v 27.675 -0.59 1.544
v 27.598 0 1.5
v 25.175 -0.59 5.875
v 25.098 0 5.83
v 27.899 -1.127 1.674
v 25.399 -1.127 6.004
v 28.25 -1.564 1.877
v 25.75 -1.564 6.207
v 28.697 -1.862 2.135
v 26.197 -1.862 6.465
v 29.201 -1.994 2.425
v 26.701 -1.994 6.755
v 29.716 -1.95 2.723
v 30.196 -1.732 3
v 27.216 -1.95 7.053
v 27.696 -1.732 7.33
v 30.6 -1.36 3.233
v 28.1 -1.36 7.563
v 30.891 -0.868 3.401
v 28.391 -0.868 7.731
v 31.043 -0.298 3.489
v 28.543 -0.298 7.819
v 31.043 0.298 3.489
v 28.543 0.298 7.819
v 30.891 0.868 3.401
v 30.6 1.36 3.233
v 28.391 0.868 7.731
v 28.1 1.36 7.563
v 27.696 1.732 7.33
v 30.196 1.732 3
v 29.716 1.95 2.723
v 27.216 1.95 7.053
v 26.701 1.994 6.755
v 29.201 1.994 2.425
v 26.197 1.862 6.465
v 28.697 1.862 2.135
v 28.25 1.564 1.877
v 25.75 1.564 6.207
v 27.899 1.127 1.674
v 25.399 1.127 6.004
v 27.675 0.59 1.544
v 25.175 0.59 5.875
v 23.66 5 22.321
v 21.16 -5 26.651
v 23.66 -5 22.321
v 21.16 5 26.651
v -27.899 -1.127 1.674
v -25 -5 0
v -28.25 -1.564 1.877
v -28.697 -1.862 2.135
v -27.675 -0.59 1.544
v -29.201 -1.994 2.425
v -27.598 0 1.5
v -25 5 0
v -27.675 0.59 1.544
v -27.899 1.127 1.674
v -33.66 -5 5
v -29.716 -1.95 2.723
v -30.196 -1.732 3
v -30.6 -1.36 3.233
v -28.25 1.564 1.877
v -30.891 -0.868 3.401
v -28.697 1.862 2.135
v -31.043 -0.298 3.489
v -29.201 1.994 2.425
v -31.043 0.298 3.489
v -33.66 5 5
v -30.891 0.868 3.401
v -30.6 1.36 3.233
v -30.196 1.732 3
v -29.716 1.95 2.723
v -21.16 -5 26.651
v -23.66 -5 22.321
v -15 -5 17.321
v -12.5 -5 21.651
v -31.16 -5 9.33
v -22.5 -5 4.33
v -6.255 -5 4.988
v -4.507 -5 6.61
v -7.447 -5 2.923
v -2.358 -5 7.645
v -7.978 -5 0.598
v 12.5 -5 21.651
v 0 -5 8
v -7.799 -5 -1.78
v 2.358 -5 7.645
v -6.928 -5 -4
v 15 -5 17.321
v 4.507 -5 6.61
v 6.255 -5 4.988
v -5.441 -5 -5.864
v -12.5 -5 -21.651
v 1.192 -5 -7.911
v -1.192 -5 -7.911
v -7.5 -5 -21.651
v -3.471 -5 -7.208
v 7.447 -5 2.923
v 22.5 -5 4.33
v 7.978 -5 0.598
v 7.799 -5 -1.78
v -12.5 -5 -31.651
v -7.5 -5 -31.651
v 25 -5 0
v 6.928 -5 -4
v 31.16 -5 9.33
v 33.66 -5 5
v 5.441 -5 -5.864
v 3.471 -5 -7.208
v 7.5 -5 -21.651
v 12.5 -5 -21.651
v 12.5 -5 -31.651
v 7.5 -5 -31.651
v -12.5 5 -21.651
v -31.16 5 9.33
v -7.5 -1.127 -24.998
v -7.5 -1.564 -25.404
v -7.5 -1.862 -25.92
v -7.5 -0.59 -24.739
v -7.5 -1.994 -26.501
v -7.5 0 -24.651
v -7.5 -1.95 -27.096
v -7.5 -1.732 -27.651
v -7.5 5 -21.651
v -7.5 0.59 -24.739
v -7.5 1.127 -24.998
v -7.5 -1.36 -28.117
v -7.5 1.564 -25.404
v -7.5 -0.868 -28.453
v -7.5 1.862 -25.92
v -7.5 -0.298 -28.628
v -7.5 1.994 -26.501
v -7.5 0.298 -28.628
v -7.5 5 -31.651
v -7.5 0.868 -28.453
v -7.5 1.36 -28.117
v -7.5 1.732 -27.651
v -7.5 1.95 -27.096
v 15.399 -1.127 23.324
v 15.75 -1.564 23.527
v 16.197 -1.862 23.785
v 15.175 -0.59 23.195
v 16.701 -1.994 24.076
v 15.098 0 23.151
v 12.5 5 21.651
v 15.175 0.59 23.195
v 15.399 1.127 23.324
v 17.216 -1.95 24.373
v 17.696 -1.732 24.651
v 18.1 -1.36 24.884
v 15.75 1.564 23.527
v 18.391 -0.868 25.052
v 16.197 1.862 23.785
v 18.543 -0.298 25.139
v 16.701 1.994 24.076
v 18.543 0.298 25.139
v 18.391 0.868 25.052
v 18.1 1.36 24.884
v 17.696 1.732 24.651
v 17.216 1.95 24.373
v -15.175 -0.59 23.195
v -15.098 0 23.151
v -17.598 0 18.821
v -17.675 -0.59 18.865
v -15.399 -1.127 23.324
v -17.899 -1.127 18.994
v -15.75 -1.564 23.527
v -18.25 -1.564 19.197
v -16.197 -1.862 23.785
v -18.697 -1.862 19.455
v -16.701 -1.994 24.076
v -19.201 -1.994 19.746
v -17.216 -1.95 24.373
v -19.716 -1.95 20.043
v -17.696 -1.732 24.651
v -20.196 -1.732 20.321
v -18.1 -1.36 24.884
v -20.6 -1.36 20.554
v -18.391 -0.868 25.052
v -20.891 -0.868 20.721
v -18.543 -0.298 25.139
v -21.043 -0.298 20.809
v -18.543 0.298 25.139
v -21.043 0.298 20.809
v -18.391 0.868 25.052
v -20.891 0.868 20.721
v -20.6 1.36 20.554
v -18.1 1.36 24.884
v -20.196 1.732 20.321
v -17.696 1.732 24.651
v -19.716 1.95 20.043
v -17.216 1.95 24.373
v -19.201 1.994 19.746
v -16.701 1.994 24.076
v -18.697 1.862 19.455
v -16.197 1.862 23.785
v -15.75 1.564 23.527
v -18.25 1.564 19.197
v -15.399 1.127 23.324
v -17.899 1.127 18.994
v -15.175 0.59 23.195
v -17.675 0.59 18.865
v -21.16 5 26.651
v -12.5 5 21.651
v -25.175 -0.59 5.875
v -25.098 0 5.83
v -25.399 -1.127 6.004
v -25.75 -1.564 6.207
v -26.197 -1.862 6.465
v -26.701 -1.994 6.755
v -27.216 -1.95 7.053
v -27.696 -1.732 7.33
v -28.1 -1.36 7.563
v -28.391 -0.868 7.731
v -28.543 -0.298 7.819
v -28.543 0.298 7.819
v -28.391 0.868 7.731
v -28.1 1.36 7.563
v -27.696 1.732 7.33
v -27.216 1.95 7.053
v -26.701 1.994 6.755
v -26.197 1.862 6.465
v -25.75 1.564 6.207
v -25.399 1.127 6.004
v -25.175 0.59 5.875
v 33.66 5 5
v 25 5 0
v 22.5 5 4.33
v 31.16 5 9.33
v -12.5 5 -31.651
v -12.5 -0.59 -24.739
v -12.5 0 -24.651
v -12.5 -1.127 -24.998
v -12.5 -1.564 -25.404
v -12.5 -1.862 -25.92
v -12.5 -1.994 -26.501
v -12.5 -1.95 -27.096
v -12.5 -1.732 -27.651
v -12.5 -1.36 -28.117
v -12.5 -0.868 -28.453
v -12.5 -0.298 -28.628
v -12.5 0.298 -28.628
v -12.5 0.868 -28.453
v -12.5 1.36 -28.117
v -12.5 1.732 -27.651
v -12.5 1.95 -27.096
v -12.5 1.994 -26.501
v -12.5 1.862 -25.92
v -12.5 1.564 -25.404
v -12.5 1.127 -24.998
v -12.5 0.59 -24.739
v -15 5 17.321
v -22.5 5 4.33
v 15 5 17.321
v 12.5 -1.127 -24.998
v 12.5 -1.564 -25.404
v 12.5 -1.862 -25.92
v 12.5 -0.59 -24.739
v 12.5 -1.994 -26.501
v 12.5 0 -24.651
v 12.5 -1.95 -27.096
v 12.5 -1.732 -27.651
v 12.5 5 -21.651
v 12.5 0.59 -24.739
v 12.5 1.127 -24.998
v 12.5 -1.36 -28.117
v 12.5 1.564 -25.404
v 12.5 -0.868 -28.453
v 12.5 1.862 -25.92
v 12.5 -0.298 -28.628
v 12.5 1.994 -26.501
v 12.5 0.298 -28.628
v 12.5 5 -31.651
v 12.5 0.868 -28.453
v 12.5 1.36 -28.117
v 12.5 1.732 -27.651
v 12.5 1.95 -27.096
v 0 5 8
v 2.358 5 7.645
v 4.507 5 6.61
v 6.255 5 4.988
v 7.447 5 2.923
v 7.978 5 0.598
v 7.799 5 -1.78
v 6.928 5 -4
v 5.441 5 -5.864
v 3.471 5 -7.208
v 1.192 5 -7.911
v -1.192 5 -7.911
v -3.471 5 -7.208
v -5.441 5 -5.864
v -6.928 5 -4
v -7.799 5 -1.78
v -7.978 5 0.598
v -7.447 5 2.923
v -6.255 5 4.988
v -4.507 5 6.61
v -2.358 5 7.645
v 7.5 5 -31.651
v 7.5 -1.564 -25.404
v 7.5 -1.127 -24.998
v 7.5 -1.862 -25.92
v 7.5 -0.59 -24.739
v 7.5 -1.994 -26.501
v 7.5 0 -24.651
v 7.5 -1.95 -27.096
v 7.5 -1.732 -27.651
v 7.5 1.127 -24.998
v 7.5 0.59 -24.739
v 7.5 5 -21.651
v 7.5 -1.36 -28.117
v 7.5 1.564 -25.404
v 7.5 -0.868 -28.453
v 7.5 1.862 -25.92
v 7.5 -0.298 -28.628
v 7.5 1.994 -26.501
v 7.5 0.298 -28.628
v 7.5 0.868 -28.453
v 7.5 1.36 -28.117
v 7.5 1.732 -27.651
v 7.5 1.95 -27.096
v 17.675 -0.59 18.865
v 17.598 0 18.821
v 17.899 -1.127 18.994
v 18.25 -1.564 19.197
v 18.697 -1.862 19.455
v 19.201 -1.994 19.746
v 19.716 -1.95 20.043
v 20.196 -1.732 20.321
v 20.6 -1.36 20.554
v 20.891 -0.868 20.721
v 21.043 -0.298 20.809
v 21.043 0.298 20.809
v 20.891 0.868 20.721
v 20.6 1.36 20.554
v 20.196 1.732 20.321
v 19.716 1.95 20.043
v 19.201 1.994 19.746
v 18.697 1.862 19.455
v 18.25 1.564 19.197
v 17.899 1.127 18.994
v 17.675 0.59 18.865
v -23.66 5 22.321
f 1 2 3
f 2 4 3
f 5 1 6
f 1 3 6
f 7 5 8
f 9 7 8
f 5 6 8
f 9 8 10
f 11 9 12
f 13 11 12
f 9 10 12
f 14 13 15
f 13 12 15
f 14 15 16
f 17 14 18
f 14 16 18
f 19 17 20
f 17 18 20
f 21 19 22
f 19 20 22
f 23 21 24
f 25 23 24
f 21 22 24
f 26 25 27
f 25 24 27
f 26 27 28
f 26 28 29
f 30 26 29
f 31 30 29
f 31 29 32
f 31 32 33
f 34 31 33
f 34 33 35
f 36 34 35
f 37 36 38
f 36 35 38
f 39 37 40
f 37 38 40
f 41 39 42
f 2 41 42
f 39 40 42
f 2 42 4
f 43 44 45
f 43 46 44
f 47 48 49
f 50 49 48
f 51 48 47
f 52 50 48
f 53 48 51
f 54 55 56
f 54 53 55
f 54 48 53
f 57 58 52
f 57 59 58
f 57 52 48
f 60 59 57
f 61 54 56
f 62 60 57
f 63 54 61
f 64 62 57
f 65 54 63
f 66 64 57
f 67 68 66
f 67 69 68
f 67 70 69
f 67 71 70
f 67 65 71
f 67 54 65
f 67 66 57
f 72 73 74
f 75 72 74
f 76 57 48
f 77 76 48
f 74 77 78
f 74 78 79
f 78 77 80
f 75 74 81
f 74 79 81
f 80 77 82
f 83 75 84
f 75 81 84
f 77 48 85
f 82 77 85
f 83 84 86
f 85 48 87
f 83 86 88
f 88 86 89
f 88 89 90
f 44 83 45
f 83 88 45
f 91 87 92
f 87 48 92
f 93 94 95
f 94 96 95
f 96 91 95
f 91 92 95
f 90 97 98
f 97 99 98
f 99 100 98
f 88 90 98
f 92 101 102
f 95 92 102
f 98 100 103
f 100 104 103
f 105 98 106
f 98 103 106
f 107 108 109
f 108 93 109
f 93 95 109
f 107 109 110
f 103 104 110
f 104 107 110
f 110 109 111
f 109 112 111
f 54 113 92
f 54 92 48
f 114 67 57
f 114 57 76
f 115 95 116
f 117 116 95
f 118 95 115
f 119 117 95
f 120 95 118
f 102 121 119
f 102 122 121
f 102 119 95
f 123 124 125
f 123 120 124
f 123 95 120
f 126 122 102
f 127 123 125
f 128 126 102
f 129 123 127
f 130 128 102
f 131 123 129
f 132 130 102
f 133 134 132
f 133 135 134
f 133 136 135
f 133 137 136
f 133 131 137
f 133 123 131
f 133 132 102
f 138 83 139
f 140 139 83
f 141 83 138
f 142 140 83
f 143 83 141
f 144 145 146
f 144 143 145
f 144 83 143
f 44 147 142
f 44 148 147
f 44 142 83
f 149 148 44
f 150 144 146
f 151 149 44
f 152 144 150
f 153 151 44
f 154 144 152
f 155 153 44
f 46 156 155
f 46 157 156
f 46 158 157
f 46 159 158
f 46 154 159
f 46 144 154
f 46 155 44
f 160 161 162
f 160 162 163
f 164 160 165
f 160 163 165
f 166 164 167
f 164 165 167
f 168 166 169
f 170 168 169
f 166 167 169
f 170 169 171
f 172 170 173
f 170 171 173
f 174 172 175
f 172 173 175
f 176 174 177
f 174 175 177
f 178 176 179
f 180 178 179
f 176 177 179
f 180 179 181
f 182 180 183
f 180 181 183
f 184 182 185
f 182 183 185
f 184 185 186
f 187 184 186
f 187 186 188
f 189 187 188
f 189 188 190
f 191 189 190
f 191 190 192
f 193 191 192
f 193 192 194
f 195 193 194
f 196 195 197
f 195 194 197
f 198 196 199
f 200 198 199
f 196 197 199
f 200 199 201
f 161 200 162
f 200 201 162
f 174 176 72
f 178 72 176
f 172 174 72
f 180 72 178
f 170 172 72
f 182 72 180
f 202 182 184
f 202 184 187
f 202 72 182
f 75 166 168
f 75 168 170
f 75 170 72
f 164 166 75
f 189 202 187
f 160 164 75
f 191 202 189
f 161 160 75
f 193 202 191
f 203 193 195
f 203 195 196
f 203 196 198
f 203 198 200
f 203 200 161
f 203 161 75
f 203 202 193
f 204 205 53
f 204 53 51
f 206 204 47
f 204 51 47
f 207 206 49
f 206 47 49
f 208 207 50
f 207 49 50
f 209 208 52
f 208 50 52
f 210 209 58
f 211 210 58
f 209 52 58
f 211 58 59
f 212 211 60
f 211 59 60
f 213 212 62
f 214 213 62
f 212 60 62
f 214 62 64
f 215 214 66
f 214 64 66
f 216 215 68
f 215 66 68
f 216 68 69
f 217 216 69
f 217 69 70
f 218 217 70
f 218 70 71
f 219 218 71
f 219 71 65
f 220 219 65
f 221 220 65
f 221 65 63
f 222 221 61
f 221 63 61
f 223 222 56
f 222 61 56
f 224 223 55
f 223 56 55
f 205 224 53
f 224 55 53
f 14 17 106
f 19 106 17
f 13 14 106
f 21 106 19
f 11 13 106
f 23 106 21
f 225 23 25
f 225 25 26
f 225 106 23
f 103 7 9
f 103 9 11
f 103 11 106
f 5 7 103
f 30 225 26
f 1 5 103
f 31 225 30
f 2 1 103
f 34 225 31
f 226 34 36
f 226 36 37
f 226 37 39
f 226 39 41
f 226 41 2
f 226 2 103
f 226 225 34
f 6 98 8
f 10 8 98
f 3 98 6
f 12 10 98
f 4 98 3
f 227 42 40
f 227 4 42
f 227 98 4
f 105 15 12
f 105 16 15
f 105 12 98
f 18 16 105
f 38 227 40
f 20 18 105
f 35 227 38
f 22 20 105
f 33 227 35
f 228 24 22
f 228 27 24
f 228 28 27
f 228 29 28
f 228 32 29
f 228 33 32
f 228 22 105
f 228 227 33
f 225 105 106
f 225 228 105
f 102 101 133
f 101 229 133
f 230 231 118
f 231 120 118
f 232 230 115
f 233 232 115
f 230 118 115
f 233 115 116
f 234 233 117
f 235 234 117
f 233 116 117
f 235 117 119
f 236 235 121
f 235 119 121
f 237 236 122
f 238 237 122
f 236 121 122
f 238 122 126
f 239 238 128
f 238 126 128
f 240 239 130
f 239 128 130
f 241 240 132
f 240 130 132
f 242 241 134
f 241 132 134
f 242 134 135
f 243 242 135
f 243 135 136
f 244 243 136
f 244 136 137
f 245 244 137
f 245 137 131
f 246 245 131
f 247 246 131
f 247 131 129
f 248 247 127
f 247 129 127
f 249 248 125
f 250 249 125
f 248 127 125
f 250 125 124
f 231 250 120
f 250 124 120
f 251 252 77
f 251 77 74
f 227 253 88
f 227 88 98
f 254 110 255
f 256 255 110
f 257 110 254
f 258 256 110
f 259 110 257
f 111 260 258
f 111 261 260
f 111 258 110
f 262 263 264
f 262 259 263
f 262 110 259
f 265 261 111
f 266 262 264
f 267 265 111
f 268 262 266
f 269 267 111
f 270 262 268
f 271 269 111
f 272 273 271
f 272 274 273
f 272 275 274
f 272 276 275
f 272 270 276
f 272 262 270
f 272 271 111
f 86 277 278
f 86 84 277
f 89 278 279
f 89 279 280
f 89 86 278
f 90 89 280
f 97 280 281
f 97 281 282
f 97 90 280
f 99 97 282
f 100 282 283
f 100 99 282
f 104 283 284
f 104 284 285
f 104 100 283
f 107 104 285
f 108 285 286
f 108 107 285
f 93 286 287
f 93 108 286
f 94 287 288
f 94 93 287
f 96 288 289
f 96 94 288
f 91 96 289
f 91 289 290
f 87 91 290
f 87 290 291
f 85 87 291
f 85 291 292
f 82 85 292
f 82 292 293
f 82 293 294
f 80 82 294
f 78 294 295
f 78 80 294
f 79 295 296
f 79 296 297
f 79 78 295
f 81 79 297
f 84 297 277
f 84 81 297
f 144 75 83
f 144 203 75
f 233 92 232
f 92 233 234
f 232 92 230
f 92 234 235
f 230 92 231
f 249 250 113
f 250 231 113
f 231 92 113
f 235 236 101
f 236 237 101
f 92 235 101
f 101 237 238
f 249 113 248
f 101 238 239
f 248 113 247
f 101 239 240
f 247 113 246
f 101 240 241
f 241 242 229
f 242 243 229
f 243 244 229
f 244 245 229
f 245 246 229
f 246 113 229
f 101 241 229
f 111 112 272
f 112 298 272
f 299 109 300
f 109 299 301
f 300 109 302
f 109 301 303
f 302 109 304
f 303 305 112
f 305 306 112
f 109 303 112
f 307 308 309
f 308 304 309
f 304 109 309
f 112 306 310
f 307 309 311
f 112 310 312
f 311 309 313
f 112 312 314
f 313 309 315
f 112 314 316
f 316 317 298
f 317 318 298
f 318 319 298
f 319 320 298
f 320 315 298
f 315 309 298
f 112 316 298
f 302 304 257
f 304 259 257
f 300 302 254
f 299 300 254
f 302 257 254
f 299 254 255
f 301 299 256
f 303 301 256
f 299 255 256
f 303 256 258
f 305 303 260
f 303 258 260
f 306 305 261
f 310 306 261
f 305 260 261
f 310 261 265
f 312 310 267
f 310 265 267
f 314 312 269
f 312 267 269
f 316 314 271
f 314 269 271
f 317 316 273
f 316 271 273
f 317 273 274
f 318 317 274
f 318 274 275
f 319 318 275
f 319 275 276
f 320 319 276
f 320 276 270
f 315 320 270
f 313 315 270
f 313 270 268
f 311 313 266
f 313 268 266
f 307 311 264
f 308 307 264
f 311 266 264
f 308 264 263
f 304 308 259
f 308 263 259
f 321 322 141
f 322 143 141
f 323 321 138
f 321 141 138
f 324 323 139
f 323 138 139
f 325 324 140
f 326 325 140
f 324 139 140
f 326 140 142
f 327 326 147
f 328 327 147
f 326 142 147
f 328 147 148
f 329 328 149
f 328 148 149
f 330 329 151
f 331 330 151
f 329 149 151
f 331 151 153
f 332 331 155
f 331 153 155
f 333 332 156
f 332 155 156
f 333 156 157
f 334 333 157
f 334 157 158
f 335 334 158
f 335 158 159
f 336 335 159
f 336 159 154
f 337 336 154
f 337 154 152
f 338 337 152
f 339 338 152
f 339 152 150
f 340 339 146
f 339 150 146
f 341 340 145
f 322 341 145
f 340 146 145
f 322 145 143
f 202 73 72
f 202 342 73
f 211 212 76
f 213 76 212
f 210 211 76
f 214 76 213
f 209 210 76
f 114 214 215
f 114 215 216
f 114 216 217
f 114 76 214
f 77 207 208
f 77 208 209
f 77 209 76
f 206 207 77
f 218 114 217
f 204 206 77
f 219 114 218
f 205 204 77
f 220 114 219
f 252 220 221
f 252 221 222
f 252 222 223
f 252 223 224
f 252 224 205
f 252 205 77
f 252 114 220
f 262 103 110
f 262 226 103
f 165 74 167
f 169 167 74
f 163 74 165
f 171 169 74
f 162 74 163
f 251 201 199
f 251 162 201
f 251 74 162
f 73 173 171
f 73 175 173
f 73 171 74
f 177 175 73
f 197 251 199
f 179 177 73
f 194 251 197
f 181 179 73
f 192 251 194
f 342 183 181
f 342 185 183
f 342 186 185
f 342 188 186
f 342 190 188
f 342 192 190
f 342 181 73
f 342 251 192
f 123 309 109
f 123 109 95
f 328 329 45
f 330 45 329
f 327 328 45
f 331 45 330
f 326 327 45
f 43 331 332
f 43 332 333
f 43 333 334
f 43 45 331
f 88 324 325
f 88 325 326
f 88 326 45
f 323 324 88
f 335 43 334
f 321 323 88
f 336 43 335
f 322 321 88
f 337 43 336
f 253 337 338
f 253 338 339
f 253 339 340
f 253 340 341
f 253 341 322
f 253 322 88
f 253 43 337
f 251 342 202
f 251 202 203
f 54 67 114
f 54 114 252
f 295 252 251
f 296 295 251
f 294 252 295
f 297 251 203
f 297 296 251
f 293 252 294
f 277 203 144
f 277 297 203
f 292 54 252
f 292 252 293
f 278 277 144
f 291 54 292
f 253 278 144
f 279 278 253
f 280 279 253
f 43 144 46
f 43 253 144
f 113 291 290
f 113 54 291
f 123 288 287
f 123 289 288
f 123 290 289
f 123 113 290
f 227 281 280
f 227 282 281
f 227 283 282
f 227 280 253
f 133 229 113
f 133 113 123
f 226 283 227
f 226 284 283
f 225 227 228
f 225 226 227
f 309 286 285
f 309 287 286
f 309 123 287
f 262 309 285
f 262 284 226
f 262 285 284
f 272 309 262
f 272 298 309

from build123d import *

# Parameters (mm, degrees)
SKETCH1_R           = 8
BOSS_EXTRUDE1_DEPTH = 5
SKETCH2_R           = 2
CUT_EXTRUDE1_DEPTH  = 15
CIRPATTERN1_COUNT   = 3


with BuildPart() as part:
    # Sketch1 → Boss-Extrude1 (new, symmetric)
    with BuildSketch(Plane(origin=(0, 0, 0), x_dir=(1, 0, 0), z_dir=(0, 1, 0))):
        Polygon((7.5, 21.650635095), (-7.5, 21.650635095), (-7.5, 31.650635095), (-12.5, 31.650635095), (-12.5, 21.650635095), (-25, 0), (-33.660254038, -5), (-31.160254038, -9.330127019), (-22.5, -4.330127019), (-15, -17.320508076), (-23.660254038, -22.320508076), (-21.160254038, -26.650635095), (-12.5, -21.650635095), (12.5, -21.650635095), (21.160254038, -26.650635095), (23.660254038, -22.320508076), (15, -17.320508076), (22.5, -4.330127019), (31.160254038, -9.330127019), (33.660254038, -5), (25, 0), (12.5, 21.650635095), (12.5, 31.650635095), (7.5, 31.650635095), align=None)
        Circle(SKETCH1_R, mode=Mode.SUBTRACT)
    extrude(amount=BOSS_EXTRUDE1_DEPTH, both=True)

    # Sketch2 → Cut-Extrude1 (cut, symmetric)
    with BuildSketch(Plane(origin=(0, 0, 0), x_dir=(0, 0, -1), z_dir=(1, 0, 0))):
        with Locations((26.650635095, 0)):
            Circle(SKETCH2_R)
    cut_extrude1 = extrude(amount=CUT_EXTRUDE1_DEPTH, both=True, mode=Mode.SUBTRACT)

    # CirPattern1: Cut-Extrude1 ×3 about axis
    cirpattern1_axis = Axis((0, 5, 0), (0, -1, 0))
    for i in range(1, CIRPATTERN1_COUNT):
        add(cut_extrude1.rotate(cirpattern1_axis, i * 360 / CIRPATTERN1_COUNT), mode=Mode.SUBTRACT)


solid = part.part
